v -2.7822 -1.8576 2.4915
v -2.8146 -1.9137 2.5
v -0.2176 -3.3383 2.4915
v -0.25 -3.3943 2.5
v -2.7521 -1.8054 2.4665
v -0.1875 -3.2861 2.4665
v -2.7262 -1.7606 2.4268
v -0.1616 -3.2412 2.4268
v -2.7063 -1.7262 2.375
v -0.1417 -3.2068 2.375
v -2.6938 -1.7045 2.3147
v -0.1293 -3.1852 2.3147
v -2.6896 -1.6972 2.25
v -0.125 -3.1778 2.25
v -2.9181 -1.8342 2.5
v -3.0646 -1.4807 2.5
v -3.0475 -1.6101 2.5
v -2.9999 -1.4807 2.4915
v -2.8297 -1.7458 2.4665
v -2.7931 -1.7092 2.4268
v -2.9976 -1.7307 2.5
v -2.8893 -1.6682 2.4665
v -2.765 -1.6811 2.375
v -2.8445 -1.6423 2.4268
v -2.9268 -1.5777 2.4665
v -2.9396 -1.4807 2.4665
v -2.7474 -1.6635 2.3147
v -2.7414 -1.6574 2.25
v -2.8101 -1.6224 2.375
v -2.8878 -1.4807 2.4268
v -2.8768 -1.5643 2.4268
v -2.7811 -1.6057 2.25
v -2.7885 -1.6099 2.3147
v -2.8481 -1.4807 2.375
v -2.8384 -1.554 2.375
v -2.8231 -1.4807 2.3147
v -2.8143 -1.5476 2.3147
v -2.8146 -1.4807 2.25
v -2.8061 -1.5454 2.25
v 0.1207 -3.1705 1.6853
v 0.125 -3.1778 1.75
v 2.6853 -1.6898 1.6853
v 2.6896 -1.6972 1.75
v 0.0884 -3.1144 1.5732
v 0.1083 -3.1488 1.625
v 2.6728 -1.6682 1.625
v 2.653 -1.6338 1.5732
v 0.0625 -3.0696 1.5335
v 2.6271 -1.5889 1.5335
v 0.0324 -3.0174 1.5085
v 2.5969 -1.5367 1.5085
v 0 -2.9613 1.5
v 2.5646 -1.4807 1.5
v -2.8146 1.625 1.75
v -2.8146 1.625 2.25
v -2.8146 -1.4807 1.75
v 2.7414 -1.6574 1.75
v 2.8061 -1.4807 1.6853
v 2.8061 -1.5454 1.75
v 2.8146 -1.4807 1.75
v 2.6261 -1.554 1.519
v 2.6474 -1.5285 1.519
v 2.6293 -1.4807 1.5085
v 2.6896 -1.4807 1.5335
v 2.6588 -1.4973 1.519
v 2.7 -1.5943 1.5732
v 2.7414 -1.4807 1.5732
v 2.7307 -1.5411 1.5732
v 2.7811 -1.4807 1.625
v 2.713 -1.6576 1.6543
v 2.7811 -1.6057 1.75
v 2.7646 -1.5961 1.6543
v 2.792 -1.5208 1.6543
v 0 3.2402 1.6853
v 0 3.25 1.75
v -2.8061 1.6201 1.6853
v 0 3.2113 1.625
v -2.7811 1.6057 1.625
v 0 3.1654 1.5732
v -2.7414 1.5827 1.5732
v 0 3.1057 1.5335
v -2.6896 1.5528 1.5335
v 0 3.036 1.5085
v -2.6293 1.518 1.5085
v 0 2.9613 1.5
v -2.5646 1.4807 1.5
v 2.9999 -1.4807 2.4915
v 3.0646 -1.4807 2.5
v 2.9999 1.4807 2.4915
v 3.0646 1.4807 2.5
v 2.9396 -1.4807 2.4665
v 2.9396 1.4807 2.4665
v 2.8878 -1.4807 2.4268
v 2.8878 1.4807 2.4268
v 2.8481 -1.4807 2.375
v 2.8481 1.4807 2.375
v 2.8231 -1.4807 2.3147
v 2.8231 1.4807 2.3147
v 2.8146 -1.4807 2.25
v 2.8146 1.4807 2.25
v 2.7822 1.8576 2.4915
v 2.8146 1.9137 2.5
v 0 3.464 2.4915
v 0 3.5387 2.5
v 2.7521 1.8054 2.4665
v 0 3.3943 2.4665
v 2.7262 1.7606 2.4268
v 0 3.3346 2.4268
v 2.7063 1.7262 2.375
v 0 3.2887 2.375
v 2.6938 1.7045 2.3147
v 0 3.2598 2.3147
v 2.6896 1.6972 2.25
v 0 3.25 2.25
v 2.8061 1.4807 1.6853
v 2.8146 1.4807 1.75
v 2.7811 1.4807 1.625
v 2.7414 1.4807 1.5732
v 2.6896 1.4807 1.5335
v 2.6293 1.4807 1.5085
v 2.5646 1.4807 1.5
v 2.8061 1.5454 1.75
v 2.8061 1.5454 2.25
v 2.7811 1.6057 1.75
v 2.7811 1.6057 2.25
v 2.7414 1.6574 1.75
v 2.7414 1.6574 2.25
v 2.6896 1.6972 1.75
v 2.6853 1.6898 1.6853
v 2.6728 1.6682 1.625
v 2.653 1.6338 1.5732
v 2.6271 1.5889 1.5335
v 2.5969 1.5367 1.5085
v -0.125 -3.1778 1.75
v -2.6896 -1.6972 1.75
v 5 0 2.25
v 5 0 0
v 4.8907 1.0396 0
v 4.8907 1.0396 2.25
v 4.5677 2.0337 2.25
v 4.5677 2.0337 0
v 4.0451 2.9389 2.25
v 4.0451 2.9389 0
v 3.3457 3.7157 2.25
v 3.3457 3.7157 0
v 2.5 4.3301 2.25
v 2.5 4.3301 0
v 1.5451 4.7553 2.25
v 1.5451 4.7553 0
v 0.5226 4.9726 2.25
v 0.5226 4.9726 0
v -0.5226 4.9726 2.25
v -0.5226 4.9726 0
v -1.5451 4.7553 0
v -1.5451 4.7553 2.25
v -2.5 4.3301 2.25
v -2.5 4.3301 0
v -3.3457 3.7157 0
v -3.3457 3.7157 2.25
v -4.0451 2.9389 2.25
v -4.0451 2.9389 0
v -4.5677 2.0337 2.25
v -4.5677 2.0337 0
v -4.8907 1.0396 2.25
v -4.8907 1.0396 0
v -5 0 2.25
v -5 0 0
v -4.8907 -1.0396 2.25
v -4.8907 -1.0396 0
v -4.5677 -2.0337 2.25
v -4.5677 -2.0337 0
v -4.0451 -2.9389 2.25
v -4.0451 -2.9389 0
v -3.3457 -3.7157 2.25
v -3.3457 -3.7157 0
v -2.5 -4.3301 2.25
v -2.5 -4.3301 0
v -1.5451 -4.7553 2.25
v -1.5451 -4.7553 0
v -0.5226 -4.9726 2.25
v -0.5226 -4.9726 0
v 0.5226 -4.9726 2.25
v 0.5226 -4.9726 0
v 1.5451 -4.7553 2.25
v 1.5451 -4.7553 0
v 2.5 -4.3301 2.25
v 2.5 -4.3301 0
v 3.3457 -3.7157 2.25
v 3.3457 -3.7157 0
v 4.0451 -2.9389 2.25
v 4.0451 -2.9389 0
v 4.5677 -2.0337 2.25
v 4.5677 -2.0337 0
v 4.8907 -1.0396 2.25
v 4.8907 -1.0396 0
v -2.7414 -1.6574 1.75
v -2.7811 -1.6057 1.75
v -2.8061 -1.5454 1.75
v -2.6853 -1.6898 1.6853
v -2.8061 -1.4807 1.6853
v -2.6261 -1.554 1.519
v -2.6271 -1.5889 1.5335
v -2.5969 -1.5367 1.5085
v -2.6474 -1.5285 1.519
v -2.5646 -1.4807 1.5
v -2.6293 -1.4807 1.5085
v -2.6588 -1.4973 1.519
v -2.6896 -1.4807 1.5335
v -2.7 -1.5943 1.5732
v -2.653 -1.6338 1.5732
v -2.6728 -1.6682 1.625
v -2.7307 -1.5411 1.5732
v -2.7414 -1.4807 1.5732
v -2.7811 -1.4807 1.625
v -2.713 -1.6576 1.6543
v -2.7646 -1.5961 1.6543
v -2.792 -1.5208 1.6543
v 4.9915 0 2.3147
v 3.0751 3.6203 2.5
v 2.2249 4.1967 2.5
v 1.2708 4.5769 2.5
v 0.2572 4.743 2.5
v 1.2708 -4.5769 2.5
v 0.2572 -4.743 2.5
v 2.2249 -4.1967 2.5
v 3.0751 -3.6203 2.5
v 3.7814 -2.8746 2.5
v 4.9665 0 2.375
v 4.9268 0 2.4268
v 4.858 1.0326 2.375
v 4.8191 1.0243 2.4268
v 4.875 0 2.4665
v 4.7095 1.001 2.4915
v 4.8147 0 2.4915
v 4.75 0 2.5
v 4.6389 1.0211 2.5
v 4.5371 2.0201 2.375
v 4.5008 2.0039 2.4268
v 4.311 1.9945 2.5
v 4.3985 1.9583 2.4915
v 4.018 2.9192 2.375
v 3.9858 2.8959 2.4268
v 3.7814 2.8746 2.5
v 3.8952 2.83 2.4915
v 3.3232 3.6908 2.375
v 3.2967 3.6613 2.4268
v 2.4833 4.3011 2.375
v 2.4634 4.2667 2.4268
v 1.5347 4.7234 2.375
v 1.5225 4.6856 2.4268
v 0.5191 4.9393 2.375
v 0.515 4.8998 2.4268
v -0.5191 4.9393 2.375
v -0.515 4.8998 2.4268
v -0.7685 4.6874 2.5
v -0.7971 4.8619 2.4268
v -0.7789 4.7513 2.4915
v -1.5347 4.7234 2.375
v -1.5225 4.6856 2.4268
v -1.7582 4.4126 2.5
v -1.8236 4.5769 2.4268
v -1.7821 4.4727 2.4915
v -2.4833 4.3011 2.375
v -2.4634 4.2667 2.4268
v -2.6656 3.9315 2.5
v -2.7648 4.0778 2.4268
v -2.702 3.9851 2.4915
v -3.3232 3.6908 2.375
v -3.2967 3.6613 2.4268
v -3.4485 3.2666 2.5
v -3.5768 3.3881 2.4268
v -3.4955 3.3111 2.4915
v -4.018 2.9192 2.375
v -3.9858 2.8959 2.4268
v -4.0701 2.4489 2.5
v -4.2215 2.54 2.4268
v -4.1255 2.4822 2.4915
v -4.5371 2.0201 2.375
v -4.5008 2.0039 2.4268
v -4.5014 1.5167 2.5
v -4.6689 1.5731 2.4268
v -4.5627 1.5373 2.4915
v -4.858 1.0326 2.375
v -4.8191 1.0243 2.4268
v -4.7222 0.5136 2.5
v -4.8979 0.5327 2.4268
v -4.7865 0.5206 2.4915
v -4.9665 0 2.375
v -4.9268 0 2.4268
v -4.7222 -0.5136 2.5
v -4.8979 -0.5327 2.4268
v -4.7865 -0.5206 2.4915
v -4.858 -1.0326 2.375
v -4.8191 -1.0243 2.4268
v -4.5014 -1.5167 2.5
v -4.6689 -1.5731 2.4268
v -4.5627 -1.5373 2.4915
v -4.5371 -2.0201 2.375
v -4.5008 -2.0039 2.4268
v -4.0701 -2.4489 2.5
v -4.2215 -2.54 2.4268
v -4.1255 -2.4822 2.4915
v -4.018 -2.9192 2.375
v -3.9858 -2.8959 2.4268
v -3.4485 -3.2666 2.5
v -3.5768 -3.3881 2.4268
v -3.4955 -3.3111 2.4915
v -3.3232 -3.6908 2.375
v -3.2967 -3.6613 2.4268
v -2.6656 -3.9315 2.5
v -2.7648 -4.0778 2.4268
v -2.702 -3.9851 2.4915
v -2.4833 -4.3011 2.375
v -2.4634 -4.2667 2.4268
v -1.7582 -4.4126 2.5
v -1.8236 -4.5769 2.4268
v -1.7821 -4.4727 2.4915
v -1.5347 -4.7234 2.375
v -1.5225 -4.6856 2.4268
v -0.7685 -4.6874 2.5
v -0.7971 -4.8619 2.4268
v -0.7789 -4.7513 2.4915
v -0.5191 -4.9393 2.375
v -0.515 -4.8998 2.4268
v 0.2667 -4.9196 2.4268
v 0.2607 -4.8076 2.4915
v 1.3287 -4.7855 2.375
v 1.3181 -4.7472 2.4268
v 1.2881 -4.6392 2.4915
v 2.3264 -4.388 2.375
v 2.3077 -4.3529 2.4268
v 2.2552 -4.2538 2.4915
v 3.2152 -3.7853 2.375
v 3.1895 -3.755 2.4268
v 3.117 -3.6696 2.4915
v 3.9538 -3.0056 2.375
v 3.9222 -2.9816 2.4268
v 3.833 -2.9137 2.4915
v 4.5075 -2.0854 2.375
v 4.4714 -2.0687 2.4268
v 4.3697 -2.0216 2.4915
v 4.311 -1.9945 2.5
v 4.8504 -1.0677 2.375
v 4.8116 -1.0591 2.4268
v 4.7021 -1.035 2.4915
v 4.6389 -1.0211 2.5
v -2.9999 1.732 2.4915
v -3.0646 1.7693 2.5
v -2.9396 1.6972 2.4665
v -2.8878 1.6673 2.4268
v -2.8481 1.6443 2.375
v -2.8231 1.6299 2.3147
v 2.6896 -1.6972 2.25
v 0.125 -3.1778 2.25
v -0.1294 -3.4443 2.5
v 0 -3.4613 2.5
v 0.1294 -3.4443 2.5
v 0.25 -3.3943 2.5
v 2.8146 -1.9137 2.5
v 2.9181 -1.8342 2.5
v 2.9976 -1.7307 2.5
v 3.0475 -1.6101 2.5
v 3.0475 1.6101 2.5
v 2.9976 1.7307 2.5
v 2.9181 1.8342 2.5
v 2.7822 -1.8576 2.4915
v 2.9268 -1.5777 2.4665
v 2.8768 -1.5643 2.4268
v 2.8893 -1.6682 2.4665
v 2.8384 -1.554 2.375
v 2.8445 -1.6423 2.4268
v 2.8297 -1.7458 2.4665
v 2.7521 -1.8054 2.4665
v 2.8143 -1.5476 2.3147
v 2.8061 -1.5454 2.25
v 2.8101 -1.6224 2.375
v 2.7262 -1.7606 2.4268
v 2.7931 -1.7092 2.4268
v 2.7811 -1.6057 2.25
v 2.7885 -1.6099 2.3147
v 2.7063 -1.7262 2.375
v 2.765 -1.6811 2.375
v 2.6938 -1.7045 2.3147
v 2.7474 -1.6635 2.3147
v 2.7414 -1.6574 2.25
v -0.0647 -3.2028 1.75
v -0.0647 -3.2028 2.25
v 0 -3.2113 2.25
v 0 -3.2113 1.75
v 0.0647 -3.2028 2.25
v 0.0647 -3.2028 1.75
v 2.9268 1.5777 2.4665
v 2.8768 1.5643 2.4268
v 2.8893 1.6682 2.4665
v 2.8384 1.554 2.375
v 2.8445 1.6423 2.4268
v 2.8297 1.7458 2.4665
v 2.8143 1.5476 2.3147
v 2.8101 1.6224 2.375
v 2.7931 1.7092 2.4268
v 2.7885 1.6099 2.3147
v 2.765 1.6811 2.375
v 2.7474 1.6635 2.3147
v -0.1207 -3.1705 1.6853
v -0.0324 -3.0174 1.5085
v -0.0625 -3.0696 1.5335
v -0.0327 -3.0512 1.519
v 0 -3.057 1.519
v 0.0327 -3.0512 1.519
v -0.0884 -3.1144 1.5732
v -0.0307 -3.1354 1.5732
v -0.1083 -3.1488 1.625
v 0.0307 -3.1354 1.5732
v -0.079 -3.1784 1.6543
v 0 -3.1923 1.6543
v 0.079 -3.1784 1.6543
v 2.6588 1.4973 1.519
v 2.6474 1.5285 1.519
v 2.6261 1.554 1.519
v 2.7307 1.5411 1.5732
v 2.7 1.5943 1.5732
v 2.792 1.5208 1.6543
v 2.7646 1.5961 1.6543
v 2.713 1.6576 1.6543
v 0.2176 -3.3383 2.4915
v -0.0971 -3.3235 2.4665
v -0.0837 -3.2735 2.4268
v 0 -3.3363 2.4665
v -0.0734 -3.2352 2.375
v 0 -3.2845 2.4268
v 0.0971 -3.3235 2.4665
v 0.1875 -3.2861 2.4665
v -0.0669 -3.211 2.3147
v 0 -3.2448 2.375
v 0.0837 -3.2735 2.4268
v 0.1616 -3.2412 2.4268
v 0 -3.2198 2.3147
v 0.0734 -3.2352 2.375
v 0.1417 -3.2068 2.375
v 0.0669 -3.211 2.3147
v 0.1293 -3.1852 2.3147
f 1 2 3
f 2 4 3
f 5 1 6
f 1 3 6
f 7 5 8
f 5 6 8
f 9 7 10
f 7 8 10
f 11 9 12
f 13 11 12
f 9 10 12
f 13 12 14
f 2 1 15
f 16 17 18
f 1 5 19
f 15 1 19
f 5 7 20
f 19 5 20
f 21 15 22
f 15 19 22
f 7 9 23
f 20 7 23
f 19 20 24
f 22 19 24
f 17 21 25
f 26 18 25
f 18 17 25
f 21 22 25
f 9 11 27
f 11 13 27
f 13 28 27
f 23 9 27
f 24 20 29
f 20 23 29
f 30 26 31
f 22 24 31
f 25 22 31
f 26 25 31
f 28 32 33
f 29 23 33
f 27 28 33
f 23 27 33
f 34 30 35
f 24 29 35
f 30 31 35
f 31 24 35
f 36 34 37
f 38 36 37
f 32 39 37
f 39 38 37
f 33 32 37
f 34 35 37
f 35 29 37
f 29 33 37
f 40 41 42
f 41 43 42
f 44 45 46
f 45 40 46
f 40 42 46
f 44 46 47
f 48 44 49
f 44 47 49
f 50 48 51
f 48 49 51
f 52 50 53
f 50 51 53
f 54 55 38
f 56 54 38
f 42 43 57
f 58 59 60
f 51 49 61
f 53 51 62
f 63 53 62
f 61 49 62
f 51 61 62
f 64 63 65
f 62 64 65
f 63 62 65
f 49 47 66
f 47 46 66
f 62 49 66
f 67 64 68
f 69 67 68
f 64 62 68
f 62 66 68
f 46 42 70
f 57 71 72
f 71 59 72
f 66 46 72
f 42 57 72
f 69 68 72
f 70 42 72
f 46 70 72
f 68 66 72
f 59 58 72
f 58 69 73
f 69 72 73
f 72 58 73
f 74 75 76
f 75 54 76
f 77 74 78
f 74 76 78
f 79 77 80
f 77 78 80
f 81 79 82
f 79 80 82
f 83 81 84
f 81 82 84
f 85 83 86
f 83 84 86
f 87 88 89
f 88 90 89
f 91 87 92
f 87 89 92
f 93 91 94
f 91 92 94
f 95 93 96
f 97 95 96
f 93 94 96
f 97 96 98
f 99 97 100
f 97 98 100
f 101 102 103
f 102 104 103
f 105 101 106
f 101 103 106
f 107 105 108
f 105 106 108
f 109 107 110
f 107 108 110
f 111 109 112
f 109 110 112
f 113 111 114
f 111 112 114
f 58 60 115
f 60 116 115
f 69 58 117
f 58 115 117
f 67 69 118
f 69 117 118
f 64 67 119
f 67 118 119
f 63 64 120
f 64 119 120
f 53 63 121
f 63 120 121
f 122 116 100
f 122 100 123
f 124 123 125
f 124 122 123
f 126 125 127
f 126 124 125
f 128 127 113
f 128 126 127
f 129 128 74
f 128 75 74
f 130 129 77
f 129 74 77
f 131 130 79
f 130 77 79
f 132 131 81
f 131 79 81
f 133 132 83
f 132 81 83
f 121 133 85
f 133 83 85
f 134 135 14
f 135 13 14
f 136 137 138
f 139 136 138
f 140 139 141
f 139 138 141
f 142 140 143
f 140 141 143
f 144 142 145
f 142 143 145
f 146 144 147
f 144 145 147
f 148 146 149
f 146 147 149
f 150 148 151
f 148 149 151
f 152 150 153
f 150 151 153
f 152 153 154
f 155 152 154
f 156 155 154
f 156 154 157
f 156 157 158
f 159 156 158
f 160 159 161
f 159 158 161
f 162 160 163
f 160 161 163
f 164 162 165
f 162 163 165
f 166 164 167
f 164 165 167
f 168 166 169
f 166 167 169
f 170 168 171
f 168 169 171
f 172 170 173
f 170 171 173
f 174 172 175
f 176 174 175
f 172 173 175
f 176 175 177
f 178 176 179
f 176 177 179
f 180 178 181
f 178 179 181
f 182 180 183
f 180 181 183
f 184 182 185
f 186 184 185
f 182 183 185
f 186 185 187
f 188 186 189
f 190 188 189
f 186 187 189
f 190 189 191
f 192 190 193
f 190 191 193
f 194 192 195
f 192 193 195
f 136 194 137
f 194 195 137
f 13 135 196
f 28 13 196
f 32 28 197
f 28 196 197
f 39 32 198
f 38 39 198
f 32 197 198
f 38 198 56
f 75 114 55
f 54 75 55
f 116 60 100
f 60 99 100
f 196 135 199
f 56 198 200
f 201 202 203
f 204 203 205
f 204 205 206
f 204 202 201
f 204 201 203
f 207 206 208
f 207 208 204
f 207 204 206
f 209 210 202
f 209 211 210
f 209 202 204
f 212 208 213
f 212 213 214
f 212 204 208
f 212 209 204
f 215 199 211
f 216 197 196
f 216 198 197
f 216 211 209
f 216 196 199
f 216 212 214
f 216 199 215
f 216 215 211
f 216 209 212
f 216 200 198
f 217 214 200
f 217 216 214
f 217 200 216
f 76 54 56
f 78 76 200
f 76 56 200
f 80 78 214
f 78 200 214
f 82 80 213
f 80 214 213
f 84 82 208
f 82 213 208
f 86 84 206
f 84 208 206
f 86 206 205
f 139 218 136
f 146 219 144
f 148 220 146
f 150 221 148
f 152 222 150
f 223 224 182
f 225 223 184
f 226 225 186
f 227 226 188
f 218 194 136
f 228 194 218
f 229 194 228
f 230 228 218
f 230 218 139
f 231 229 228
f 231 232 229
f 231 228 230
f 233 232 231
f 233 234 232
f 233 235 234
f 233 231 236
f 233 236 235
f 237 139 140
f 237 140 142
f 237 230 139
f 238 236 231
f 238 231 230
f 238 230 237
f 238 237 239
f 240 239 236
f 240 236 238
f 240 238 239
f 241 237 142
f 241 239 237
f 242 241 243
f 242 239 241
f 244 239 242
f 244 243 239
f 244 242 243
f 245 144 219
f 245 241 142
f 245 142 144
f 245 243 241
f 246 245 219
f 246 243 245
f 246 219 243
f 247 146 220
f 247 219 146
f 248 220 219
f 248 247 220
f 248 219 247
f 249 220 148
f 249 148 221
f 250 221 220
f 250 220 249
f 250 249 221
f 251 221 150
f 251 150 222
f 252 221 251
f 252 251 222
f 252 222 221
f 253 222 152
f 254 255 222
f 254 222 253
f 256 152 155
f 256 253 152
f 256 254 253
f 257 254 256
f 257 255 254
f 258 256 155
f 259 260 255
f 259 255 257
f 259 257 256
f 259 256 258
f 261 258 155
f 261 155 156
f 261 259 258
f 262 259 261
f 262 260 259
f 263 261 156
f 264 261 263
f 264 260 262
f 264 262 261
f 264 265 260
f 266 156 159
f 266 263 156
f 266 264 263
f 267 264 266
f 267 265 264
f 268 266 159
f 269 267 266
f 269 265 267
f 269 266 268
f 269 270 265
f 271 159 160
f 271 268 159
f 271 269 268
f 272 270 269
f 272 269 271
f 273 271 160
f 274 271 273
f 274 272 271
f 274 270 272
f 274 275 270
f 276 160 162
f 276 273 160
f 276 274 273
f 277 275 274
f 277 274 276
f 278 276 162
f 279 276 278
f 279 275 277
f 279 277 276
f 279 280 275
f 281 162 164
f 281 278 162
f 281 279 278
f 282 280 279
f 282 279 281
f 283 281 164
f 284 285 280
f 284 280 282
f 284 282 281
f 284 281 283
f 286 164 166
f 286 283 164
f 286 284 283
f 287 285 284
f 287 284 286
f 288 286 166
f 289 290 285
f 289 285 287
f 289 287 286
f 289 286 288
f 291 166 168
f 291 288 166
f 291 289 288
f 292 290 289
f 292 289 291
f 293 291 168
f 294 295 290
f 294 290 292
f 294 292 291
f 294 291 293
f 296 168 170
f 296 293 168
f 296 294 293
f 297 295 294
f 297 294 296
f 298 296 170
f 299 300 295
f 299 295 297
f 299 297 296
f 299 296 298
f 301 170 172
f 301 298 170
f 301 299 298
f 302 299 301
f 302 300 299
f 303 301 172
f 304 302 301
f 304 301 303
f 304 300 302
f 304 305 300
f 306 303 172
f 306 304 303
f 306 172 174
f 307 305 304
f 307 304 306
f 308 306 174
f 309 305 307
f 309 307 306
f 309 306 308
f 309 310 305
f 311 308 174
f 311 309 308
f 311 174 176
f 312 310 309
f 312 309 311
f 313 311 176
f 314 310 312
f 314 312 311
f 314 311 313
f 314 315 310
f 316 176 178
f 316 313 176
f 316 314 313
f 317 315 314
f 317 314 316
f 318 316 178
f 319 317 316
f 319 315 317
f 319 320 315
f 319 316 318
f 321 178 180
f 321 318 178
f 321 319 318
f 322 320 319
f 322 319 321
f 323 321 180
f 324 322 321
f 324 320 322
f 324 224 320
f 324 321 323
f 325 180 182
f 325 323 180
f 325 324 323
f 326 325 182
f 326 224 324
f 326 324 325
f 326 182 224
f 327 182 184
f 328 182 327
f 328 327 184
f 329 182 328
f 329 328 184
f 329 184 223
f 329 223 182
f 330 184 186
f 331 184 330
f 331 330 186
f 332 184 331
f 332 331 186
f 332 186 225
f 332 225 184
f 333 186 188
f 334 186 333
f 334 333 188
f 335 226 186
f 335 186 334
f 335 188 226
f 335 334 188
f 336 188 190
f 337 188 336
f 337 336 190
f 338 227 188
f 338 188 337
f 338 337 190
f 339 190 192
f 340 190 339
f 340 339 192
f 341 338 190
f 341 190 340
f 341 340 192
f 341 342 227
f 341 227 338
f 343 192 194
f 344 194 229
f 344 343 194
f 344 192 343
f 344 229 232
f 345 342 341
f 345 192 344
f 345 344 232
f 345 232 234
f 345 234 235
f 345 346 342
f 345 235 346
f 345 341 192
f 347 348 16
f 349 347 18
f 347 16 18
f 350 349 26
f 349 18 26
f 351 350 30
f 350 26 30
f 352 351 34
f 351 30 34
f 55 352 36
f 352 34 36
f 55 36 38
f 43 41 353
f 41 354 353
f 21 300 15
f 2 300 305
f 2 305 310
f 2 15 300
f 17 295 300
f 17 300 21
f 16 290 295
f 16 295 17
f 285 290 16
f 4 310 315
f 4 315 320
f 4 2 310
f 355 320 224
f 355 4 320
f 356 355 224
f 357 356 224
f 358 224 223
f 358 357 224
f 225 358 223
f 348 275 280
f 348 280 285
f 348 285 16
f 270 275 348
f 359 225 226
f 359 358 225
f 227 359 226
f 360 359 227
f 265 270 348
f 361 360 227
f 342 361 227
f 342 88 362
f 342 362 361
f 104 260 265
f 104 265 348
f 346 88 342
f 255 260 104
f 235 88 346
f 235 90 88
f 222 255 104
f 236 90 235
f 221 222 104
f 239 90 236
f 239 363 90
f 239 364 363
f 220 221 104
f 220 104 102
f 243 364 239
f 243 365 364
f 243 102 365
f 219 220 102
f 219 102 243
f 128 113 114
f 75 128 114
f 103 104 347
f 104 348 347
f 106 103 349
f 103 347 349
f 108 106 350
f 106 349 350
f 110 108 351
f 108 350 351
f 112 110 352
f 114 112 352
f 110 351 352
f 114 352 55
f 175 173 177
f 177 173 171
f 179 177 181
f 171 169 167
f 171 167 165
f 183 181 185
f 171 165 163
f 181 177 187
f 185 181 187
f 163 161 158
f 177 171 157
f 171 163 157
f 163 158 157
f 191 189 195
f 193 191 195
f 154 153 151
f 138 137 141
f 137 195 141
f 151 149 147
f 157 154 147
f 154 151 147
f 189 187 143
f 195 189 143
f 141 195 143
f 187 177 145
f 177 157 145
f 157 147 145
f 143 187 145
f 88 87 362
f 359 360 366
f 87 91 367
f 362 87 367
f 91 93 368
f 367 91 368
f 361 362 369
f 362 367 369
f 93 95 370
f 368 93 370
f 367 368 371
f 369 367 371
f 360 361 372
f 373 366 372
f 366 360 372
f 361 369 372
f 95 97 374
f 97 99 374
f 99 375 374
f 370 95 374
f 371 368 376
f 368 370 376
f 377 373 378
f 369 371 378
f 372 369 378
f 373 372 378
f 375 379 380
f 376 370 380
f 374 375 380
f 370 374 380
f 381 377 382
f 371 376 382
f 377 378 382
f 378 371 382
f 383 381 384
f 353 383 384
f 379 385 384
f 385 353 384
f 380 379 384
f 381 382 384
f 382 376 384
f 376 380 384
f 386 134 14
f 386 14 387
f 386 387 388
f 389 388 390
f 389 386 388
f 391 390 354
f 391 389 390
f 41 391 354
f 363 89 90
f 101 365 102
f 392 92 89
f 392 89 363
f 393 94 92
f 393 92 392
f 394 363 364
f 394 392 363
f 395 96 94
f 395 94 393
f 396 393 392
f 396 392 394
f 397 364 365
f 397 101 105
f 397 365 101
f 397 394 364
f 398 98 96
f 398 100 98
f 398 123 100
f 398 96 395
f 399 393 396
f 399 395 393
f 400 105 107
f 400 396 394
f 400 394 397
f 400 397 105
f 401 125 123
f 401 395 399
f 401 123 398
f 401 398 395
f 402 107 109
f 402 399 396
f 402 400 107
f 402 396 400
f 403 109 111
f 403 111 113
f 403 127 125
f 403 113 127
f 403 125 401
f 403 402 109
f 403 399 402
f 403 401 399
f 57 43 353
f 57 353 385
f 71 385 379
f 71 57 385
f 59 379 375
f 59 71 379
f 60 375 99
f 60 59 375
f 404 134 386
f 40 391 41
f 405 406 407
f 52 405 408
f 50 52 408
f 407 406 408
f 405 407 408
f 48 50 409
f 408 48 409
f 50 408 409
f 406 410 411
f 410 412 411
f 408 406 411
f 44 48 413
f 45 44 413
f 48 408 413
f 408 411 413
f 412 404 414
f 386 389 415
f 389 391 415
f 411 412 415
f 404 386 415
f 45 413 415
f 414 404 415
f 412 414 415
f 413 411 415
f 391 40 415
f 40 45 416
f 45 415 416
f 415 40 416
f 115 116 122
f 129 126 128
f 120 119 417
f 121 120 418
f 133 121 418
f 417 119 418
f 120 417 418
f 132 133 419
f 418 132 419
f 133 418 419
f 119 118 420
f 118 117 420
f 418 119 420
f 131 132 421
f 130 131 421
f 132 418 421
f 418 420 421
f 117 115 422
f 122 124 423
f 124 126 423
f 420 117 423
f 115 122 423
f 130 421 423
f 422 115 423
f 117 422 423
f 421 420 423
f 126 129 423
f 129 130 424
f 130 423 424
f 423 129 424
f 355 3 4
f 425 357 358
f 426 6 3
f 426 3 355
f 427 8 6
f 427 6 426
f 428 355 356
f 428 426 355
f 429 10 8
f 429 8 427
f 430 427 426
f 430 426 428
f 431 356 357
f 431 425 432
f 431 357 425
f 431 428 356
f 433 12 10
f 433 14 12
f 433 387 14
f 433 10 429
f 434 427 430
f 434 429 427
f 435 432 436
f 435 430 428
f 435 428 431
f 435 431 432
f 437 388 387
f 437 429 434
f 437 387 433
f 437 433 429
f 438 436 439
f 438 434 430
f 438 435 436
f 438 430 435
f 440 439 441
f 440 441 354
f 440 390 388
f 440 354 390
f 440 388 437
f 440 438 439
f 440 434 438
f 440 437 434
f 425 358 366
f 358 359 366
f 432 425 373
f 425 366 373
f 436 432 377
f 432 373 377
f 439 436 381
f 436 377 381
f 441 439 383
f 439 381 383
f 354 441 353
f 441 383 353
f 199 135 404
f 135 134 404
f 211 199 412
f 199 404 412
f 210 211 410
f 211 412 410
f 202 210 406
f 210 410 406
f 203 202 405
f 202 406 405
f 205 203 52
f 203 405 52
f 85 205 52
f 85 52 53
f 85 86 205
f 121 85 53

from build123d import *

# Parameters (mm, degrees)
F0_R     = 5
F1_DEPTH = 2.5
F3_DEPTH = 1
F4_R     = 0.25


with BuildPart() as f1:
    # F0 (on Top) → F1 (new body)
    with BuildSketch(Plane.XY):
        Circle(F0_R)
    extrude(amount=F1_DEPTH)

    # F2 (on face) → F3 (cut)
    with BuildSketch(Plane.XY.offset(2.5)):
        Polygon((-2.8145825623, -1.625), (0, -3.25), (2.8145825623, -1.625), (2.8145825623, 1.625), (0, 3.25), (-2.8145825623, 1.625), align=None)
    extrude(amount=-F3_DEPTH, mode=Mode.SUBTRACT)

    # F4
    f4_edges = [f1.edges().sort_by_distance(p)[0] for p in [
        (-1.407291, -2.4375, 1.5),
        (1.407291, -2.4375, 1.5),
        (2.814583, 0, 1.5),
        (1.407291, 2.4375, 1.5),
        (-1.407291, 2.4375, 1.5),
        (-2.814583, 0, 1.5),
        (2.814583, -1.625, 2),
        (2.814583, 1.625, 2),
        (2.814583, 0, 2.5),
        (-1.407291, 2.4375, 2.5),
        (-2.814583, 0, 2.5),
        (-2.814583, -1.625, 2),
        (0, -3.25, 2),
        (-1.407291, -2.4375, 2.5),
        (1.407291, -2.4375, 2.5),
        (-5, 0, 2.5),
        (1.407291, 2.4375, 2.5),
    ]]
    fillet(f4_edges, radius=F4_R)


solid = f1.part
